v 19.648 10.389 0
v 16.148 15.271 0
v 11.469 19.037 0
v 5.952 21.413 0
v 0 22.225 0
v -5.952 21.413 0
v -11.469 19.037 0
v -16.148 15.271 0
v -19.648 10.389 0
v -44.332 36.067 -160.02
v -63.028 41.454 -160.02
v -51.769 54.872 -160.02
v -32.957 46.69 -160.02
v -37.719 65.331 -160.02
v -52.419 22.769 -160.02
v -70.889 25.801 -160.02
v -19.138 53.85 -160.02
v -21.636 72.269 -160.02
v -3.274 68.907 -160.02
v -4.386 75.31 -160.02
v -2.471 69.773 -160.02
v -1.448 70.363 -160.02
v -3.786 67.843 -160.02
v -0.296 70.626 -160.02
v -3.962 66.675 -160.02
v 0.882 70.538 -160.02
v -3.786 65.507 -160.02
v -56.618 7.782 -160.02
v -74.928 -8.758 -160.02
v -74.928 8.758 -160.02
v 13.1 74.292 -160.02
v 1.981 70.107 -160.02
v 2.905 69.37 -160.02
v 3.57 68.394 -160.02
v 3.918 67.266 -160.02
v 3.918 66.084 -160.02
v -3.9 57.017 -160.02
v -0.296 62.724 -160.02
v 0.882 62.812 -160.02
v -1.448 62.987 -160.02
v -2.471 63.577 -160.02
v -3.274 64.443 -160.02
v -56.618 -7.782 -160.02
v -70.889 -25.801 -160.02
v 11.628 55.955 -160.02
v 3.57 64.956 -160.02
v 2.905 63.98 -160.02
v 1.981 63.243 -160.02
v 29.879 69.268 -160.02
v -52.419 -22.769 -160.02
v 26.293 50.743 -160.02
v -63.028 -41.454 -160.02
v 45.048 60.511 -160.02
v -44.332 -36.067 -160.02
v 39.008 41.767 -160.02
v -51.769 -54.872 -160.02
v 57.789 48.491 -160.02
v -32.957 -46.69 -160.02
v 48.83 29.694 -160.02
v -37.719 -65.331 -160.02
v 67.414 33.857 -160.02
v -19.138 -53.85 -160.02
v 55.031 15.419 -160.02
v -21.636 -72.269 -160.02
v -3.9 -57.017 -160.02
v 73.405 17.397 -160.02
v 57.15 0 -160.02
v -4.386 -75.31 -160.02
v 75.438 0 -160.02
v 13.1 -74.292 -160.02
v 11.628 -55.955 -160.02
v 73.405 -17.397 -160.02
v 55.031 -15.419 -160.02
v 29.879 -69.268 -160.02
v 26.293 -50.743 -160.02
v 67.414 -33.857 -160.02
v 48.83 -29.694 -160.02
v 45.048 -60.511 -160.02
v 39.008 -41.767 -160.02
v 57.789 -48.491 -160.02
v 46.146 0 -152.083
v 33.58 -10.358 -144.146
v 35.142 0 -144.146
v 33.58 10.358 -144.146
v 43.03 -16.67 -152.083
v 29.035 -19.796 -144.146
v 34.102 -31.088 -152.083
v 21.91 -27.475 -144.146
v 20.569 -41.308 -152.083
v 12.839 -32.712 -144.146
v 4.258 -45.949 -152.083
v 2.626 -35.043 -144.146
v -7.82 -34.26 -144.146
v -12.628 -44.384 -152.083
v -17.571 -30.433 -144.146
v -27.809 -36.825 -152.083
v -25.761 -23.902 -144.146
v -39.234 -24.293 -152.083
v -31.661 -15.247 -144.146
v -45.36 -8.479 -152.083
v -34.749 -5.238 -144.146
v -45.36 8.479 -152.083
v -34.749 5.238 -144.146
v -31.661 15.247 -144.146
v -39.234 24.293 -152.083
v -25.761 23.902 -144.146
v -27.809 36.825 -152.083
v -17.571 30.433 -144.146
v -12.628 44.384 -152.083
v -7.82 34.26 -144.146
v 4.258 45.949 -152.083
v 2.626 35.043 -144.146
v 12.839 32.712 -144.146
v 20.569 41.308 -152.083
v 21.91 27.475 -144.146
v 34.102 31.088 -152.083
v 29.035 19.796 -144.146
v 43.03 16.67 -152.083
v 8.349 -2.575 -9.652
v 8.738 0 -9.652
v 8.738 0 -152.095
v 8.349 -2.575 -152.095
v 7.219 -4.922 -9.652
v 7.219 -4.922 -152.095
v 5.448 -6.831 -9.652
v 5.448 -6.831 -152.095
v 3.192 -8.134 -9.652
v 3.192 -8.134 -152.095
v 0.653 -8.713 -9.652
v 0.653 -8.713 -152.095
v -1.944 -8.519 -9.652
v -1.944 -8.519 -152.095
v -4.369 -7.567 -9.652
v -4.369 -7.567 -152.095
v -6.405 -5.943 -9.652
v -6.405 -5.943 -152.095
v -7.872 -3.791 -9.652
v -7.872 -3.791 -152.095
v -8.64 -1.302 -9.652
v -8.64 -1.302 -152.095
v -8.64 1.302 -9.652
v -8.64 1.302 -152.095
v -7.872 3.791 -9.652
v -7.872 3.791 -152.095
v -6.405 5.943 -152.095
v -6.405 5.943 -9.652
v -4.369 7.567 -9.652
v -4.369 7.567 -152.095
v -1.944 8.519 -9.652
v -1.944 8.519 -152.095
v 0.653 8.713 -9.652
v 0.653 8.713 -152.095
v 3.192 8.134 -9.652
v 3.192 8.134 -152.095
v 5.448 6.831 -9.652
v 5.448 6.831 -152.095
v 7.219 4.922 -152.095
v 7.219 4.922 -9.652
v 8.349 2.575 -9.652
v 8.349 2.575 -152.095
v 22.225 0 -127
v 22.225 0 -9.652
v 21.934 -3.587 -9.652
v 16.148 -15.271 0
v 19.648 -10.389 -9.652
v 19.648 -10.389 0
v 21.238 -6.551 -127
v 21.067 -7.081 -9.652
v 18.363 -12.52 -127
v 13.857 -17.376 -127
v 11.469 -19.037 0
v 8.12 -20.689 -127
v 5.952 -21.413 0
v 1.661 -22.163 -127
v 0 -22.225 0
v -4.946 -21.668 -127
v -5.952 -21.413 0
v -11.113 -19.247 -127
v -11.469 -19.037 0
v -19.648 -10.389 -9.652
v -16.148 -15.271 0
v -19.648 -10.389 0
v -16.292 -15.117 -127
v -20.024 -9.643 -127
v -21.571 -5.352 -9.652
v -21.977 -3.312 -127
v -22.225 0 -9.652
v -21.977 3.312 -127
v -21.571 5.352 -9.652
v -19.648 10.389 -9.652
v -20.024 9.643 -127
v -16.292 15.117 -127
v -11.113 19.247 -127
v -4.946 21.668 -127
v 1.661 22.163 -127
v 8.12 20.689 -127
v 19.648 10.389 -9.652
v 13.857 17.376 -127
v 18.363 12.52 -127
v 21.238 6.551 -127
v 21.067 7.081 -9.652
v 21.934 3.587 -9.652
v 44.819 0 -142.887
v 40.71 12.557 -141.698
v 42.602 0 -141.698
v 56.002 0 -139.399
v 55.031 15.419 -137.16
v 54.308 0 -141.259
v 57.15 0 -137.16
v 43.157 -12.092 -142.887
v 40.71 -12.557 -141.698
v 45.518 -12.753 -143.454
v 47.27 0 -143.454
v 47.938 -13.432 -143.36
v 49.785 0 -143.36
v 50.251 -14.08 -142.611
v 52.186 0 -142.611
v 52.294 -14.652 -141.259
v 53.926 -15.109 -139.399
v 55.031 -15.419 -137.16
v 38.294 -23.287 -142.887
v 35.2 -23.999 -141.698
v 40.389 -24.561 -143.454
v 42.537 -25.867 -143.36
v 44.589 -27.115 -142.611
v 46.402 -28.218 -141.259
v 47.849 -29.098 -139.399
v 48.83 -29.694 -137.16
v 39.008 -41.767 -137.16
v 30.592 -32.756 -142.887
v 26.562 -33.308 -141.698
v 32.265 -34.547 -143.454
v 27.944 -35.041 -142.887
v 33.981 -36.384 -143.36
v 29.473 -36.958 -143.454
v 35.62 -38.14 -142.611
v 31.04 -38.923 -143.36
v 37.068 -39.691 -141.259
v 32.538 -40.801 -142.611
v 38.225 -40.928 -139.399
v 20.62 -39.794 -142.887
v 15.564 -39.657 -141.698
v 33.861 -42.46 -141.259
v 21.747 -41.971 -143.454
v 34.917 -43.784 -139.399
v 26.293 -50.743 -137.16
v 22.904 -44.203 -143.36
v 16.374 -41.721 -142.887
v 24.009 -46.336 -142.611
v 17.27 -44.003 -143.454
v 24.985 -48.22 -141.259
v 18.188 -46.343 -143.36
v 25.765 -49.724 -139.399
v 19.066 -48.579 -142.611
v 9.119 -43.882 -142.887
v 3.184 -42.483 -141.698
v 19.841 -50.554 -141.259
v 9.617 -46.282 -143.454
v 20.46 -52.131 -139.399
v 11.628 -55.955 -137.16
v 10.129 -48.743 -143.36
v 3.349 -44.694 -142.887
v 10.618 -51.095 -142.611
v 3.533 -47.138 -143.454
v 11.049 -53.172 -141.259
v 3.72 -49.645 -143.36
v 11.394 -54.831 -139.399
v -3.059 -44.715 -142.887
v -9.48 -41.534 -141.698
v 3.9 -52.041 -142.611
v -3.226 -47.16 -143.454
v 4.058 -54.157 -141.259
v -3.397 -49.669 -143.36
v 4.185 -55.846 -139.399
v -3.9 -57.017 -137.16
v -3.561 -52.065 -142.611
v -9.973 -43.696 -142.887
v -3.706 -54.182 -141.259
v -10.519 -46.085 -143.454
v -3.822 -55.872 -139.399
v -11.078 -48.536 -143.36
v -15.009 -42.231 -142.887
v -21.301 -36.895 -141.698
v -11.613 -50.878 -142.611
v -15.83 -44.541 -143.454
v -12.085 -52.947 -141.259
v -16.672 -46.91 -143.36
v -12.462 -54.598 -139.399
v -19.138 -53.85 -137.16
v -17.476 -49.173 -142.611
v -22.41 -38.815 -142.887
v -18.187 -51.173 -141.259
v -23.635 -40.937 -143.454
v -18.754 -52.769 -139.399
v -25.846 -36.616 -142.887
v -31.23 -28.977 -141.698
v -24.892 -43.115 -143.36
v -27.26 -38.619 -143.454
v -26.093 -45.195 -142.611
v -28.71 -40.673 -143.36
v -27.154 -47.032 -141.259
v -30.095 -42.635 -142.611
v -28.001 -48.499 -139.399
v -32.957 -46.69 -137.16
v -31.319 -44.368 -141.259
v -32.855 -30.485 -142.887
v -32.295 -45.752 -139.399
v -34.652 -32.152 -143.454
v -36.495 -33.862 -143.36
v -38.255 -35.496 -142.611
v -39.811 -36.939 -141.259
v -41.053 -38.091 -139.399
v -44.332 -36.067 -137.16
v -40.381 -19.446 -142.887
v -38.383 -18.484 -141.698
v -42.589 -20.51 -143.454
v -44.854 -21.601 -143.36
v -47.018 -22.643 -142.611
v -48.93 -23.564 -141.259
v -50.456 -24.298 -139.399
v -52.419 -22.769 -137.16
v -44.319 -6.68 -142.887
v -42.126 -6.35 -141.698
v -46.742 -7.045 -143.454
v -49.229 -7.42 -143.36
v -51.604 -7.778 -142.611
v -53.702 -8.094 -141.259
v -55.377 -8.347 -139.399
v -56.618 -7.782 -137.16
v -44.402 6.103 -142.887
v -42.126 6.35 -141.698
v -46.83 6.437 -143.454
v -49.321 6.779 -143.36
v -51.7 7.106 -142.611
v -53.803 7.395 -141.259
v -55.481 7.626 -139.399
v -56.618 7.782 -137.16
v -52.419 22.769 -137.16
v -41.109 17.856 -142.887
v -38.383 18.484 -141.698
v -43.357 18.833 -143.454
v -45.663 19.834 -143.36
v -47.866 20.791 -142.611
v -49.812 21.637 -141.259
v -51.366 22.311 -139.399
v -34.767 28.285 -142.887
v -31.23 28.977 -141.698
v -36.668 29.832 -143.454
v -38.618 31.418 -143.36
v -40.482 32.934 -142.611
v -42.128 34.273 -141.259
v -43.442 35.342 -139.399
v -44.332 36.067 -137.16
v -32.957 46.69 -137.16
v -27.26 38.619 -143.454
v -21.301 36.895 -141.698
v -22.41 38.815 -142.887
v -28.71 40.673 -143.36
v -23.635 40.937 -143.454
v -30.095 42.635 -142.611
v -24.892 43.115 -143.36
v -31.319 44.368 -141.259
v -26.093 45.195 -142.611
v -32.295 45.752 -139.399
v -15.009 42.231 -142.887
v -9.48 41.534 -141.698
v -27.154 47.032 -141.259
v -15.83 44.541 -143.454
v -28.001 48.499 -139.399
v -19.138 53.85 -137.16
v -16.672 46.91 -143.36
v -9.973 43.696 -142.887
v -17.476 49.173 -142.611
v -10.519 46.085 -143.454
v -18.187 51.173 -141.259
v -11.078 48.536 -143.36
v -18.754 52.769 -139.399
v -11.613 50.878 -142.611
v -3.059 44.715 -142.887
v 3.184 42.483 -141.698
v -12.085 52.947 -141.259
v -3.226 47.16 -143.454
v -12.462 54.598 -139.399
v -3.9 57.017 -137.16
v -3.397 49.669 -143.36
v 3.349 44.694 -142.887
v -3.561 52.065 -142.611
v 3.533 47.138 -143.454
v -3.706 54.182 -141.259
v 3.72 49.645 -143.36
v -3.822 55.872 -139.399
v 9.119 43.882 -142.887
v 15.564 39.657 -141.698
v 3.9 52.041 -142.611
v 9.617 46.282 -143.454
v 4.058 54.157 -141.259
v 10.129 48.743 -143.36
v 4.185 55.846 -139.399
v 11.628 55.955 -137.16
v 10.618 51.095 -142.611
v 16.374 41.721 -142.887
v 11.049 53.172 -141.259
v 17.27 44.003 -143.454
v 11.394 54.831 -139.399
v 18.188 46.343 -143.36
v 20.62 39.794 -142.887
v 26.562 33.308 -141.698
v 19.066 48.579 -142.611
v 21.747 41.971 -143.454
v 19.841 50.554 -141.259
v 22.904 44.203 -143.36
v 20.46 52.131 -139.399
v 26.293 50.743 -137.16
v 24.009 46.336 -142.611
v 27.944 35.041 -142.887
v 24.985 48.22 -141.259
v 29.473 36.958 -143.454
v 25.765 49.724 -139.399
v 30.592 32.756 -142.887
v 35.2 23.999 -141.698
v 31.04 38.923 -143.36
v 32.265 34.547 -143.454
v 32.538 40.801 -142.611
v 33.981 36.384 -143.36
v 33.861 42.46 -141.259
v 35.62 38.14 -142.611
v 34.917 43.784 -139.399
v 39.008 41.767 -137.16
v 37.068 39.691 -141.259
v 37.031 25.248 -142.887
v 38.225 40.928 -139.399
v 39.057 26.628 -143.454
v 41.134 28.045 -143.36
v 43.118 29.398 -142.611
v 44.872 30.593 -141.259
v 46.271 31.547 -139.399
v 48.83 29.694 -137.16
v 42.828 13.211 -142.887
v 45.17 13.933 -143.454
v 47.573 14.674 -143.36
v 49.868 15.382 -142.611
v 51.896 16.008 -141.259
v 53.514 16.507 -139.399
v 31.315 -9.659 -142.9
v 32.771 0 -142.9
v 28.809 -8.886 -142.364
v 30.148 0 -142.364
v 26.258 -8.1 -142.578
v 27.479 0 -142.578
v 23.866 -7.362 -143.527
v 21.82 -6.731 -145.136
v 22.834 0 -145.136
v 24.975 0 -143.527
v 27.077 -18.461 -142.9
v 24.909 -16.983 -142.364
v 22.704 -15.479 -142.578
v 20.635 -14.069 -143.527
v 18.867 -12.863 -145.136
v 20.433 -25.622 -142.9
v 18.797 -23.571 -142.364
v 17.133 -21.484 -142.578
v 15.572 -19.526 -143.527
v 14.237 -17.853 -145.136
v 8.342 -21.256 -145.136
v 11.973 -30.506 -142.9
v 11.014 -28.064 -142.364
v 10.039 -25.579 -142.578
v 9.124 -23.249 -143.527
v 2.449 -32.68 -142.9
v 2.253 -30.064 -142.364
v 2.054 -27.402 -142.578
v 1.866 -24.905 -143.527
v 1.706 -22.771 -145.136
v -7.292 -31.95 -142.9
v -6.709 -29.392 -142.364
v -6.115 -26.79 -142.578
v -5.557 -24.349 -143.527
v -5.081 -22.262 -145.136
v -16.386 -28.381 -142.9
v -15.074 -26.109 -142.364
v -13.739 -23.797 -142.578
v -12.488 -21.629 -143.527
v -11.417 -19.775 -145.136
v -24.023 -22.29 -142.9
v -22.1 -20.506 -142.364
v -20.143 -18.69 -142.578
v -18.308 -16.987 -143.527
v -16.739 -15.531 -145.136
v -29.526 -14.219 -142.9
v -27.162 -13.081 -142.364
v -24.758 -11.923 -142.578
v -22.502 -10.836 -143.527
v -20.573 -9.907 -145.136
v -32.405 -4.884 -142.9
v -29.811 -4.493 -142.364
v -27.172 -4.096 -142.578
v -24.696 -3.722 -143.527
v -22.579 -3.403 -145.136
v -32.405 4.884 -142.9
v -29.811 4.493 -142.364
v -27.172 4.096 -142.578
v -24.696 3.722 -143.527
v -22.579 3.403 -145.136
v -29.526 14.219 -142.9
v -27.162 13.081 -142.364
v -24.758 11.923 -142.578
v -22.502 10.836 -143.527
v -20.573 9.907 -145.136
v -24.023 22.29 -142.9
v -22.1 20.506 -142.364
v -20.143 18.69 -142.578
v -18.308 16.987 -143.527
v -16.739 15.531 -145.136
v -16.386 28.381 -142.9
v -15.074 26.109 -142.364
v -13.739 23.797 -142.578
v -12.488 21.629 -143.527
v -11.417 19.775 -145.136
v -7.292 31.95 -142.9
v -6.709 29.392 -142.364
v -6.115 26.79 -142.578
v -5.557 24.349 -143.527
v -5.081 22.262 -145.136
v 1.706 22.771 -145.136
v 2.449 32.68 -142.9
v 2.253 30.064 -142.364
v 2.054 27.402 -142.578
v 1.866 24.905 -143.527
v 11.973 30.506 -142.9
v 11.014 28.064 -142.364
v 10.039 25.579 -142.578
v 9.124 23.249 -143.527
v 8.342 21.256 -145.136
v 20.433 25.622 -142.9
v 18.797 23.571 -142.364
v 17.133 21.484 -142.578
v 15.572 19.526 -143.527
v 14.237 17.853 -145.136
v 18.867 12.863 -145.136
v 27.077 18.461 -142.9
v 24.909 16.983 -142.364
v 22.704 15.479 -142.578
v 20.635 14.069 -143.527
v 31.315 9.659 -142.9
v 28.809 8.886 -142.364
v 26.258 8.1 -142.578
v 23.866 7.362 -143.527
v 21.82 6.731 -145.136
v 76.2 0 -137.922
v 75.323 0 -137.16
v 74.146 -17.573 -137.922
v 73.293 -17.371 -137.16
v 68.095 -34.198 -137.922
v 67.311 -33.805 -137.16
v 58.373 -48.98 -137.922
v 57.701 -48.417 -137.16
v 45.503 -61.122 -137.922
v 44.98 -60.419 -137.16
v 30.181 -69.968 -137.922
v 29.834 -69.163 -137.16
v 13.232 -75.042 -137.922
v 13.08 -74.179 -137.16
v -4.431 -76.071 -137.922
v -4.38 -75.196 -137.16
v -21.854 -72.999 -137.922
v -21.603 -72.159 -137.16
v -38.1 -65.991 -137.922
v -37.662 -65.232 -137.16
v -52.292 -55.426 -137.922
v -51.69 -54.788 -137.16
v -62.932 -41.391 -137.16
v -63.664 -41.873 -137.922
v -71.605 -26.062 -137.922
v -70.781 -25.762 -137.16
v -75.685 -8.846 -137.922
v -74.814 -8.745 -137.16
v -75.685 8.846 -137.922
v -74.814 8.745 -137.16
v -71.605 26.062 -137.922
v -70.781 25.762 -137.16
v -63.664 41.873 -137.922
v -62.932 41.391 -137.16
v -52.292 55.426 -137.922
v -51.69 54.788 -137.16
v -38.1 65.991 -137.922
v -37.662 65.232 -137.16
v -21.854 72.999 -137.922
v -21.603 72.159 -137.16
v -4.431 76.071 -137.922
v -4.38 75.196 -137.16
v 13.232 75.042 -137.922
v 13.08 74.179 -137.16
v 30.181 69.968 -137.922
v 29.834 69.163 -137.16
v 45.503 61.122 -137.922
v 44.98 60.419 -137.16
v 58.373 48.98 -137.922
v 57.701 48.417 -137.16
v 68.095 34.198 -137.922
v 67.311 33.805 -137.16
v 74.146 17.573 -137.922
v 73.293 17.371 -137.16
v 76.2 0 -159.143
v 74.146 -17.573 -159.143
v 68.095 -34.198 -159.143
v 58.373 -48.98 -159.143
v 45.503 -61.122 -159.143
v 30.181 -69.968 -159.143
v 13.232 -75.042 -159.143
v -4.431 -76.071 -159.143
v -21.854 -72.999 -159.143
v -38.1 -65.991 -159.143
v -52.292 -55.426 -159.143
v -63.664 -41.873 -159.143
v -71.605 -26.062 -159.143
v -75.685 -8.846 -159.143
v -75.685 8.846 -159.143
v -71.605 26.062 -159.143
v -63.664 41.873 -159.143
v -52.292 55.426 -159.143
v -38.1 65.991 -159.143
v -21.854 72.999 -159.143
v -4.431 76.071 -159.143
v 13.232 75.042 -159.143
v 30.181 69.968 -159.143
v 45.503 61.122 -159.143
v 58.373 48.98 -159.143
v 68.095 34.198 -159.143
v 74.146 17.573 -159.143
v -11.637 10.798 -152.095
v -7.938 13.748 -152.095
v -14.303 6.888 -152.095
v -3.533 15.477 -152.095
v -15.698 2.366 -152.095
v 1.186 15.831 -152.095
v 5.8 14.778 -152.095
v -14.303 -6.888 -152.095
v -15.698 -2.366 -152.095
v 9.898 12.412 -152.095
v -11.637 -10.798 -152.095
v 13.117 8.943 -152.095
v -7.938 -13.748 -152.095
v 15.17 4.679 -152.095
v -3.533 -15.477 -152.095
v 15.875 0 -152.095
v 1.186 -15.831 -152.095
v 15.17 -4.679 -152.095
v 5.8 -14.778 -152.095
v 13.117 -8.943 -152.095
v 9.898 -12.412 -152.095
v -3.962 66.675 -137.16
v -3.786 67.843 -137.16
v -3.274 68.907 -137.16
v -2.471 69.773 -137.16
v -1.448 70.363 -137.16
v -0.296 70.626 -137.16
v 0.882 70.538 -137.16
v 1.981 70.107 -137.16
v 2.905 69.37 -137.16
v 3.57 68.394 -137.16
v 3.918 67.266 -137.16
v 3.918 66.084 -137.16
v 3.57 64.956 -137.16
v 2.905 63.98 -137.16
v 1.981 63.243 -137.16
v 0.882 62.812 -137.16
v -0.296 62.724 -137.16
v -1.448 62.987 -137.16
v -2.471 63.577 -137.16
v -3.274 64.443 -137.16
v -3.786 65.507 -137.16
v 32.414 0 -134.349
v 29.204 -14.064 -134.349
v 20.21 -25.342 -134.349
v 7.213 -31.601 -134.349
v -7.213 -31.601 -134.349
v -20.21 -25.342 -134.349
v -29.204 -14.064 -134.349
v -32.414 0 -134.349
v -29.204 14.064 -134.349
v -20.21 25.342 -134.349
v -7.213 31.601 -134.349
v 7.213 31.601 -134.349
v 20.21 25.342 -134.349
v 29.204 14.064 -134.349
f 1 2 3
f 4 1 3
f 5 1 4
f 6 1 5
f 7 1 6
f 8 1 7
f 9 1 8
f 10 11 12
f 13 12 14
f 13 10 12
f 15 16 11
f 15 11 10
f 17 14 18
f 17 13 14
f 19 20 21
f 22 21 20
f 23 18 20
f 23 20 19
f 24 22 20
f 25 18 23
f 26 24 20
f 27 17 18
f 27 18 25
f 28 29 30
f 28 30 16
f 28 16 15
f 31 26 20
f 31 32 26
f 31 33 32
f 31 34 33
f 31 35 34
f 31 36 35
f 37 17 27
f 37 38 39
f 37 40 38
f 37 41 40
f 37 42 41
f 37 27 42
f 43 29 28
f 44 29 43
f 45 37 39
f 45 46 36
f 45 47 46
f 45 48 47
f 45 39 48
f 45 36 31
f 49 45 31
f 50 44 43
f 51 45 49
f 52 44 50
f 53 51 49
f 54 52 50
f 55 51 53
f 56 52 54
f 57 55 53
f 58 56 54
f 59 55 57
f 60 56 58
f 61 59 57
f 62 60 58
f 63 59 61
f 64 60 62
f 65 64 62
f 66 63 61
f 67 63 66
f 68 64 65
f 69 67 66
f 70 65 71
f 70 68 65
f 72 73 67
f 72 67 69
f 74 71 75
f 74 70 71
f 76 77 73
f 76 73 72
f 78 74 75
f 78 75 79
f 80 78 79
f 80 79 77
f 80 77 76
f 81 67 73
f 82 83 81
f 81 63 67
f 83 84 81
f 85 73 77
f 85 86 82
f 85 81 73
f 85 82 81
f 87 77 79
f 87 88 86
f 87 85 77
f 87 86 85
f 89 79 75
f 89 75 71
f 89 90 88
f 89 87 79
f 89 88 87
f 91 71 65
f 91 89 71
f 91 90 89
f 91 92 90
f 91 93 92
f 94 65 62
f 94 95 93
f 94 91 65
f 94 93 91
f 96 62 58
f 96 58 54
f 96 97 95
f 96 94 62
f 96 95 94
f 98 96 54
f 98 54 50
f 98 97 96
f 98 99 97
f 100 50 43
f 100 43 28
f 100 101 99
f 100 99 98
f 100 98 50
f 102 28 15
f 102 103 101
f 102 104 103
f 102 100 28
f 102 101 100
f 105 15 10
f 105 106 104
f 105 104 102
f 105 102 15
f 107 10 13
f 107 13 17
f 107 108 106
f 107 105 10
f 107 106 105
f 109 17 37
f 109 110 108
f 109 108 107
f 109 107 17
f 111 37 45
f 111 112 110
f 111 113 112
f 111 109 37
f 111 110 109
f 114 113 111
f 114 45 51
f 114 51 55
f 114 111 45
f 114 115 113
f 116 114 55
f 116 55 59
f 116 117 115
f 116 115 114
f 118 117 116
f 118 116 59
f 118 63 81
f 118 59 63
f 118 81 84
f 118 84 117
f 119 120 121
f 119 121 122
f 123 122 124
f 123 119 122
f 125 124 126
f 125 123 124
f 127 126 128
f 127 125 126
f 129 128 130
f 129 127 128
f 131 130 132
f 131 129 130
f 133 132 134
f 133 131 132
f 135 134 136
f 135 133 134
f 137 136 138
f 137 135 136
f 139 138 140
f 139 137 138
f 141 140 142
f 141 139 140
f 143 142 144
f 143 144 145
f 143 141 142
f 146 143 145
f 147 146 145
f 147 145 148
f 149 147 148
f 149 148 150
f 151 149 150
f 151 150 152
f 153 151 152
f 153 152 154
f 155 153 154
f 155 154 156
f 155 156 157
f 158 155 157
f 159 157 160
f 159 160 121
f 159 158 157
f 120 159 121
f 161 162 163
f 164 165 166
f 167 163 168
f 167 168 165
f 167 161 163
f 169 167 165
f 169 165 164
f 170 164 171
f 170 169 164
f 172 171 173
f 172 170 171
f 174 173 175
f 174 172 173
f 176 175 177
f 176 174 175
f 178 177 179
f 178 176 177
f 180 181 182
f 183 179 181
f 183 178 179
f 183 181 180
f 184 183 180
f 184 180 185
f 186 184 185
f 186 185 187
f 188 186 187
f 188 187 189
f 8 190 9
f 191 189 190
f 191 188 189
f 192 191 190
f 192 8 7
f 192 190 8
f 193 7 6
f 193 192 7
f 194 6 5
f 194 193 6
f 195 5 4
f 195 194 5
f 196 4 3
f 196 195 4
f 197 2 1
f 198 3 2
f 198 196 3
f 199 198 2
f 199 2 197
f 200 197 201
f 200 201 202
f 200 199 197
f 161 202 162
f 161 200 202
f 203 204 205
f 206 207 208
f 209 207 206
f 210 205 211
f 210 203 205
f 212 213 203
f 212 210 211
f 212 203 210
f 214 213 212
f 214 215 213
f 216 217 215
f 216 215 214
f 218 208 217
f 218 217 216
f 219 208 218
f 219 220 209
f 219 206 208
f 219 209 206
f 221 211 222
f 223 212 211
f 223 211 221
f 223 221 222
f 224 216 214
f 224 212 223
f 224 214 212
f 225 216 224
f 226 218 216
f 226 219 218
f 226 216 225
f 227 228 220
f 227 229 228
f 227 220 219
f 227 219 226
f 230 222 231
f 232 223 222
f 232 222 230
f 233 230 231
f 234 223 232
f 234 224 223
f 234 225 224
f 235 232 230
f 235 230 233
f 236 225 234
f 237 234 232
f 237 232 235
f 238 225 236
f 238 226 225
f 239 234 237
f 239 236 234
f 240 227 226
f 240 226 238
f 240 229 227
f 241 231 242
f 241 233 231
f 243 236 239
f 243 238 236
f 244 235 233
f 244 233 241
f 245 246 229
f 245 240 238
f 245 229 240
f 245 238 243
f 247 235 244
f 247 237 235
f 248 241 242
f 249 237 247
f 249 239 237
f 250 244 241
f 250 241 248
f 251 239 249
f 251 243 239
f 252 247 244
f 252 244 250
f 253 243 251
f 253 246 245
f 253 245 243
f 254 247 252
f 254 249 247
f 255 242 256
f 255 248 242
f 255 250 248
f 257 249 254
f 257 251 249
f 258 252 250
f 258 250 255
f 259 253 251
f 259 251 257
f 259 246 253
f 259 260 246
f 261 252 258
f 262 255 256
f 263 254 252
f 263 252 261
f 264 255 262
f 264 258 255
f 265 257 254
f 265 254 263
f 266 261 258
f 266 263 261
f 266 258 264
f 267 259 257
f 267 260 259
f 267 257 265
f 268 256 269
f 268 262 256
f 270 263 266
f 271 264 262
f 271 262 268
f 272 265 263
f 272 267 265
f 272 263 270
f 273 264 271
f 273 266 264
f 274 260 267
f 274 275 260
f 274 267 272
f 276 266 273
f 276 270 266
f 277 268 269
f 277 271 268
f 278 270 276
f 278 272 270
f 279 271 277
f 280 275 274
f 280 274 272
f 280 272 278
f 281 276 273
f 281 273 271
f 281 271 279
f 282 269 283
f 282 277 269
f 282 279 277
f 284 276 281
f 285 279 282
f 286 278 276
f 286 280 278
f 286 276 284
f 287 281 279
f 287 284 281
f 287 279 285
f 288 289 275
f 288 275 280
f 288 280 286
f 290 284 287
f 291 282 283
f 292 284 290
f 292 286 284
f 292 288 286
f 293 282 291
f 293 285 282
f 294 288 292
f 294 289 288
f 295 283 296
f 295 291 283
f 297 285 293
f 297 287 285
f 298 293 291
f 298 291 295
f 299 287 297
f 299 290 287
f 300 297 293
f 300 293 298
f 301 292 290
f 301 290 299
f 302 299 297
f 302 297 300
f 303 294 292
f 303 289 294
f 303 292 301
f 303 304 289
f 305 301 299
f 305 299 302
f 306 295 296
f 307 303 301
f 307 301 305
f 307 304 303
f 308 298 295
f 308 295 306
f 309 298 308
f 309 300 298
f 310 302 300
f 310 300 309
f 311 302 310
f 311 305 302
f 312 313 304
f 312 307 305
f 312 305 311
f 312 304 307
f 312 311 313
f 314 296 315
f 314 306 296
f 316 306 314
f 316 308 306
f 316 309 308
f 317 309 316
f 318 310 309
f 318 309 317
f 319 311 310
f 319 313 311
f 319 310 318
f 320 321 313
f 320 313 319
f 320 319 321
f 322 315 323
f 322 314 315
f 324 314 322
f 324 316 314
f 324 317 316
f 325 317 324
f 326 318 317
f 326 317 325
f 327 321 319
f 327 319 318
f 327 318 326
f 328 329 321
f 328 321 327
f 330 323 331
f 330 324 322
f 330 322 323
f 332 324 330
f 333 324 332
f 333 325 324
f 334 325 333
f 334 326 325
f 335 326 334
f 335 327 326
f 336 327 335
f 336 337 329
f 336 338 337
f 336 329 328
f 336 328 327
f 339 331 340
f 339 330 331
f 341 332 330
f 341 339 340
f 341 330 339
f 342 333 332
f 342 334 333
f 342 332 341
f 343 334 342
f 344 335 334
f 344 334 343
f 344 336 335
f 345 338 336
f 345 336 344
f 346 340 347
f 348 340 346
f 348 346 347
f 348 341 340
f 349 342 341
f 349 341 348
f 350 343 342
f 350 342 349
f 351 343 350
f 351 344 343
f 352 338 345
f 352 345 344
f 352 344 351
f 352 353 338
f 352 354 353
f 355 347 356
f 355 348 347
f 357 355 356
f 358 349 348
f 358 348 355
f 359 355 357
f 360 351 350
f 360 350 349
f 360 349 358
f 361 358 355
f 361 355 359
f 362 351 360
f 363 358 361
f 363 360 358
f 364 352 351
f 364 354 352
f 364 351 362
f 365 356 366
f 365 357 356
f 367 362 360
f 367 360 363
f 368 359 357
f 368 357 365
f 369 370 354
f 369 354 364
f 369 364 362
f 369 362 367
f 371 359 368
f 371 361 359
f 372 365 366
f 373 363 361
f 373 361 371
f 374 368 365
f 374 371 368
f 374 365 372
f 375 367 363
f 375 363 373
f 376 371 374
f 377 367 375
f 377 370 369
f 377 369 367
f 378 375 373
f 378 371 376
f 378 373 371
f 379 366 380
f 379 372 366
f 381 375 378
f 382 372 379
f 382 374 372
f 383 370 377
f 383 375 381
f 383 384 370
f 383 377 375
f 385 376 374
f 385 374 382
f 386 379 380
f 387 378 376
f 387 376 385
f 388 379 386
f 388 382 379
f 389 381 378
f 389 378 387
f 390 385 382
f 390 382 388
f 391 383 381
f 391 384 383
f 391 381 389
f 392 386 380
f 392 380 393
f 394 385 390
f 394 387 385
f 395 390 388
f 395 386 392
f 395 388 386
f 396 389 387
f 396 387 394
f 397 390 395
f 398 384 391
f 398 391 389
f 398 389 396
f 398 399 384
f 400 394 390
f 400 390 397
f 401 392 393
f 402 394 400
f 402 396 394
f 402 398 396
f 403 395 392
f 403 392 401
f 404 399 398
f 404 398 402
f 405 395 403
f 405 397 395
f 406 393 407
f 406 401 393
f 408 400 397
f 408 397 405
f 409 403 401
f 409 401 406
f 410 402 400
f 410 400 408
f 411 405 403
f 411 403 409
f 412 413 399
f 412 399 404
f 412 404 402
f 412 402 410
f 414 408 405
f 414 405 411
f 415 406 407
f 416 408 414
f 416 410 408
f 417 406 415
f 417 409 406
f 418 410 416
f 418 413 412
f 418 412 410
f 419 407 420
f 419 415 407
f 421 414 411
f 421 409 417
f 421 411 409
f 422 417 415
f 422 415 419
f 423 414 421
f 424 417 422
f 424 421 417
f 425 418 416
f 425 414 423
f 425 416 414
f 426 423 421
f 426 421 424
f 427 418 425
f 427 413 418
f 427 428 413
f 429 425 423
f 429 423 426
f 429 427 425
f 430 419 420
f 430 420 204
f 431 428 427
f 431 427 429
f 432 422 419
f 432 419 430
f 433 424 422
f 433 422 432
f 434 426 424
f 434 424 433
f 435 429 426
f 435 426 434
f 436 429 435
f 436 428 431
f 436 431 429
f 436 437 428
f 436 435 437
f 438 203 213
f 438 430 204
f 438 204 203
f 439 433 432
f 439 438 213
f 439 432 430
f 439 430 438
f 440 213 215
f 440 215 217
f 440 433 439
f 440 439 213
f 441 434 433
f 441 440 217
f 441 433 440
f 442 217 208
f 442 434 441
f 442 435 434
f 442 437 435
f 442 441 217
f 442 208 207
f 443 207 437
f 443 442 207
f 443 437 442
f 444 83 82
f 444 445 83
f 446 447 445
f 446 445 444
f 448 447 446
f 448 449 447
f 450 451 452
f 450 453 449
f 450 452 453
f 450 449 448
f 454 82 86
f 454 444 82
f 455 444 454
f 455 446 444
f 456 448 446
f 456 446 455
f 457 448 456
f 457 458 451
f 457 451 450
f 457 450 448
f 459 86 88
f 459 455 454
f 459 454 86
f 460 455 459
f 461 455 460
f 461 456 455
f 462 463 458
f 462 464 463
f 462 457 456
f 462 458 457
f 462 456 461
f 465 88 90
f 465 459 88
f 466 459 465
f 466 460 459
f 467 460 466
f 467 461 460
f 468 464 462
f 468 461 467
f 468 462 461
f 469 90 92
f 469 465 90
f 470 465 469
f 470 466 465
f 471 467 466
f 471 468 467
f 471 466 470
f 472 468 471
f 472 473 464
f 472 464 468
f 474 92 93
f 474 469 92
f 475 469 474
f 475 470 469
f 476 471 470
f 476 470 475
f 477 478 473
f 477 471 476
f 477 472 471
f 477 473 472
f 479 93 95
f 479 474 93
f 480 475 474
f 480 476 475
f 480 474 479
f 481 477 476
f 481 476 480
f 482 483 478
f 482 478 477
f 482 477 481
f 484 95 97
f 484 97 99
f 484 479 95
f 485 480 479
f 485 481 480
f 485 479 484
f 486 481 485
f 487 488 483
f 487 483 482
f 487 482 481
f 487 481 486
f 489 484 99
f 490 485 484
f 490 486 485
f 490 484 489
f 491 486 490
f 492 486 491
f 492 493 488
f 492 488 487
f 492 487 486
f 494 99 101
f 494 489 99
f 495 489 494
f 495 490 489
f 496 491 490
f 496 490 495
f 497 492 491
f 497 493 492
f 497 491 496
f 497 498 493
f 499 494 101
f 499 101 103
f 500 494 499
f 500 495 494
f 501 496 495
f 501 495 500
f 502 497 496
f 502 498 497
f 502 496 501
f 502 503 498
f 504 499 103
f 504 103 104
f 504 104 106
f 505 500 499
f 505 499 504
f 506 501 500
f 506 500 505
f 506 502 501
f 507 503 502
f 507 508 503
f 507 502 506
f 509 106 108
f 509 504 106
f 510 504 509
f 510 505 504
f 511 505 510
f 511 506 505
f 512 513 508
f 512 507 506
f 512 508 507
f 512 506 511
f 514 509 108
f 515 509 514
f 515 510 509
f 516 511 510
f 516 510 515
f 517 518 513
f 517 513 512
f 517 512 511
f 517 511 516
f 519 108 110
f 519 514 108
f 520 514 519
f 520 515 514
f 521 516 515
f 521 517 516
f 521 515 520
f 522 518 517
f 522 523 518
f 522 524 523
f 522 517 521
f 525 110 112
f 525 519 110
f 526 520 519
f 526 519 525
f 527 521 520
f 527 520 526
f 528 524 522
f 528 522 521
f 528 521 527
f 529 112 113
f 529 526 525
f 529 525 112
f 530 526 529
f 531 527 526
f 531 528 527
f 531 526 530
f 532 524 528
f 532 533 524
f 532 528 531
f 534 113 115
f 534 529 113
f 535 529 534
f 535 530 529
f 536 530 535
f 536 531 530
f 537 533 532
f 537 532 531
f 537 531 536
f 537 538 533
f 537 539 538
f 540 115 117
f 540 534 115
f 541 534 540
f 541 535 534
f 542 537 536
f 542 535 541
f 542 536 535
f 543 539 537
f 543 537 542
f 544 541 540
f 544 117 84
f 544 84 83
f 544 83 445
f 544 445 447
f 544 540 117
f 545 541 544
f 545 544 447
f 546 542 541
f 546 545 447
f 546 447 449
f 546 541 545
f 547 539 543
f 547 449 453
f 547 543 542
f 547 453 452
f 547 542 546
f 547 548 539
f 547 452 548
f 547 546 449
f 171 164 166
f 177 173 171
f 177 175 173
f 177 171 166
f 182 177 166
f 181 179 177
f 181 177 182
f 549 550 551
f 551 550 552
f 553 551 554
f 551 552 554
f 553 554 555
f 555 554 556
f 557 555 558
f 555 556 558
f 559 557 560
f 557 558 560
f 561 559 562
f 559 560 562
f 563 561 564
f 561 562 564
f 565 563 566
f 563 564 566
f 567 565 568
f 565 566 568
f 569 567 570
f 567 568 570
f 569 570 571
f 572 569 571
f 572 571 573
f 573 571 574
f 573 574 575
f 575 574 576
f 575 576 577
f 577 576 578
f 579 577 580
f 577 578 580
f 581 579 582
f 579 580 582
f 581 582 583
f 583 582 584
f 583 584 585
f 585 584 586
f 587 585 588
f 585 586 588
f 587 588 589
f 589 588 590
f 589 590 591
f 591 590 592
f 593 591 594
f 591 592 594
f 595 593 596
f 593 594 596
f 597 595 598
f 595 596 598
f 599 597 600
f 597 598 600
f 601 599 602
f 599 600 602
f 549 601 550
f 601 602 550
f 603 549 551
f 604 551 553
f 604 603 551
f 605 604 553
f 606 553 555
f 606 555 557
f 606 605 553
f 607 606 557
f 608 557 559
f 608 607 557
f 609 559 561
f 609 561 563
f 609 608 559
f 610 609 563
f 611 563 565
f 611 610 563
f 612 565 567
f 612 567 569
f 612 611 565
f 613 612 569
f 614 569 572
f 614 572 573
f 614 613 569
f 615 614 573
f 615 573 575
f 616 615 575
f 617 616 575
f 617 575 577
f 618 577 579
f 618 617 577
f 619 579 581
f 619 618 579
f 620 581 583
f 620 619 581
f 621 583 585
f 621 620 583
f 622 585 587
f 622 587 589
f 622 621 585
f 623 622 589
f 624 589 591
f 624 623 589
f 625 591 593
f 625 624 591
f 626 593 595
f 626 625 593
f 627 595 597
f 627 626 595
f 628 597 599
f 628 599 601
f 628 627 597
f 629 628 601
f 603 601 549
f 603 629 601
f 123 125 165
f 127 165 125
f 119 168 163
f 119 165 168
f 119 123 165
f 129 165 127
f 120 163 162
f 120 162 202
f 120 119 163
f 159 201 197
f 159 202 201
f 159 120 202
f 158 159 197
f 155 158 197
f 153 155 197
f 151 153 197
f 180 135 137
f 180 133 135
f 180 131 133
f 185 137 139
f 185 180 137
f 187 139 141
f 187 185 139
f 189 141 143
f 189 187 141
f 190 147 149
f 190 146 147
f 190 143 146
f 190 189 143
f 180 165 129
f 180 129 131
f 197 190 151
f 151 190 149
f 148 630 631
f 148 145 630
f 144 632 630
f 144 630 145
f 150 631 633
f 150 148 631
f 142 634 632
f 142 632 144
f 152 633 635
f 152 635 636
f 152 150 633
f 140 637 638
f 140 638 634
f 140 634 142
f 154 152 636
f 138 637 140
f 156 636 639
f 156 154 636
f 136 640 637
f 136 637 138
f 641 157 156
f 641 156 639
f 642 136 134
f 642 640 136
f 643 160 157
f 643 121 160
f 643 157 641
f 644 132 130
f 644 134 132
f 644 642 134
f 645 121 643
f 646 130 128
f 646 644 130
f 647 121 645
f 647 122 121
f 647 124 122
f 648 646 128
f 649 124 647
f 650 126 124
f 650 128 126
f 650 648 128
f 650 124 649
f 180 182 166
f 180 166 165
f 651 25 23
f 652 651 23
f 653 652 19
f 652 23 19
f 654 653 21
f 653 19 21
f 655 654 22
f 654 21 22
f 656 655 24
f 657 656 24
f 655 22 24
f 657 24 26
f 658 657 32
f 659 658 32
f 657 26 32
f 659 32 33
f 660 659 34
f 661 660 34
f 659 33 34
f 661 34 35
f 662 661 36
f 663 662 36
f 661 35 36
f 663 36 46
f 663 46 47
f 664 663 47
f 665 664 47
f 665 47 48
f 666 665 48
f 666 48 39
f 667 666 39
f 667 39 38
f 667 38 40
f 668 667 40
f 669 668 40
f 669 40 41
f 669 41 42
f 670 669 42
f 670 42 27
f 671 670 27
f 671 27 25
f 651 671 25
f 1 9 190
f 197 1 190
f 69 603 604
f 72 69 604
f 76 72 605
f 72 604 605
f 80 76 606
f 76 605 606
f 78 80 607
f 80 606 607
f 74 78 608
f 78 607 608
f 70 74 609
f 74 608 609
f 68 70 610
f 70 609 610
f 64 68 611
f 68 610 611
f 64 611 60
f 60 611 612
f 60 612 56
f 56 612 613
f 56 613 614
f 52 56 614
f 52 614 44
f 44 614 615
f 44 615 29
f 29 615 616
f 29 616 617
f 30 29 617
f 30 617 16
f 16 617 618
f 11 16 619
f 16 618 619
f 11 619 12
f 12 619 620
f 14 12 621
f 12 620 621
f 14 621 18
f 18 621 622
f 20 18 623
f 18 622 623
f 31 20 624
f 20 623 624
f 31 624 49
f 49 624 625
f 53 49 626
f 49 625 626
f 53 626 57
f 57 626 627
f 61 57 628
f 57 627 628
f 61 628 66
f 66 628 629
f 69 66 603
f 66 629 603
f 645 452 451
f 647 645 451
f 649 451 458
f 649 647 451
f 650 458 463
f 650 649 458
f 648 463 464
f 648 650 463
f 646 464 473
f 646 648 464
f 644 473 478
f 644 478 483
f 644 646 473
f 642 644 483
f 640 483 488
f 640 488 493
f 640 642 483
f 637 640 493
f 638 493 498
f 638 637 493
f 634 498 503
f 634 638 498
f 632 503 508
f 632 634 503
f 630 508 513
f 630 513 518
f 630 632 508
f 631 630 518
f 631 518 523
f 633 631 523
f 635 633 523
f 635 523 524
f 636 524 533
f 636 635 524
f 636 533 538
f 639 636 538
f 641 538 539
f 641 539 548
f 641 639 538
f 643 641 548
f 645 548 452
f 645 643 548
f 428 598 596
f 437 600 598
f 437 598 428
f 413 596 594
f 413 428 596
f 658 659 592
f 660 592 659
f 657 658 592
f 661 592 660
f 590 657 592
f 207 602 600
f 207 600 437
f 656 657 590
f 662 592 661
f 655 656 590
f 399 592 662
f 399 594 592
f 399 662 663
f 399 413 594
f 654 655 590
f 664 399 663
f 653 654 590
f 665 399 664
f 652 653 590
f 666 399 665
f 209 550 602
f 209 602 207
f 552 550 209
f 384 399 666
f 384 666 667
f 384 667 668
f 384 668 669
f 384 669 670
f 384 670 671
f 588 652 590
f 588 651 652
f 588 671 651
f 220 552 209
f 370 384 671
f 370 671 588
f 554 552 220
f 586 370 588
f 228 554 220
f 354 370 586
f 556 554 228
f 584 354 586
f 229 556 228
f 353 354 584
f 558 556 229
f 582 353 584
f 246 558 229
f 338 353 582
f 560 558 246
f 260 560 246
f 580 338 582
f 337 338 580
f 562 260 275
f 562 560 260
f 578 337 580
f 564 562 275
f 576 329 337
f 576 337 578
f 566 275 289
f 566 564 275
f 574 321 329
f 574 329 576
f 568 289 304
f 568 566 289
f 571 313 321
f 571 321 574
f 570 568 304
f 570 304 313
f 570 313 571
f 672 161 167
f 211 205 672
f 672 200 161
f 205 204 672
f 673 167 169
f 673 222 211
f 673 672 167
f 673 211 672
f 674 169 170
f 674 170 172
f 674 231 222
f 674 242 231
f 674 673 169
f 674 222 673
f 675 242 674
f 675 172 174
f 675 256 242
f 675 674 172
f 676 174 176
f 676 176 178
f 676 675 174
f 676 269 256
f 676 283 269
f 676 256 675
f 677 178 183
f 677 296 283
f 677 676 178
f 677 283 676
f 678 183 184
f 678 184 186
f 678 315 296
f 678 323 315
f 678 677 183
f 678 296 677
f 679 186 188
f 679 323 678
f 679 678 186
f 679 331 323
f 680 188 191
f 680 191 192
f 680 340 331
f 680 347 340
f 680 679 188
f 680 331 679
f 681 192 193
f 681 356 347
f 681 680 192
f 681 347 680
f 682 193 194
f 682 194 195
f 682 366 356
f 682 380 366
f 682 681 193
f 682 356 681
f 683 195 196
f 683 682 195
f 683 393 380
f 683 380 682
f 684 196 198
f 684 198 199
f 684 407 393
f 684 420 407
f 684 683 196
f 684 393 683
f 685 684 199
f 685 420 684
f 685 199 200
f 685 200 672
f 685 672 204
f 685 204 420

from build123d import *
from OCP.BRepFilletAPI import BRepFilletAPI_MakeChamfer

# Parameters (mm, degrees)
CHAMFER1_SIZE           = 0.762
CHAMFER1_SIZE2          = 0.876580726
CUT_EXTRUDE1_DEPTH      = 193.922990854
CUT_EXTRUDE1_DEPTH_BACK = 193.922990854
SKETCH2_W               = 9.652
SKETCH2_H               = 20.7772
SKETCH3_R               = 3.9624
CUT_EXTRUDE2_DEPTH      = 193.922990854


with BuildPart() as part:
    # Sketch1 → Revolve1 (revolve)
    with BuildSketch(Plane(origin=(0, 0, 0), x_dir=(0, 0, -1), z_dir=(1, 0, 0)), mode=Mode.PRIVATE) as revolve1_sk:
        with BuildLine():
            Line((0, 8.7376), (0, 22.225))
            Line((0, 22.225), (127, 22.225))
            Line((127, 22.225), (141.697599691, 42.602209504))
            ThreePointArc((141.697599691, 42.602209504), (143.065361481, 51.010384281), (137.16, 57.15))
            Line((137.16, 57.15), (137.16, 76.2))
            Line((137.16, 76.2), (160.02, 76.2))
            Line((160.02, 76.2), (160.02, 57.15))
            Line((160.02, 57.15), (144.145832257, 35.141559942))
            ThreePointArc((144.145832257, 35.141559942), (142.376686305, 28.805838284), (145.135826502, 22.834373498))
            Line((145.135826502, 22.834373498), (152.0952, 15.875))
            Line((152.0952, 15.875), (152.0952, 8.7376))
            Line((152.0952, 8.7376), (0, 8.7376))
        make_face()
    revolve(revolve1_sk.sketch.rotate(Axis((0, 0, 0), (0, 0, -1)), 90), axis=Axis((0, 0, 0), (0, 0, -1)))

    # Chamfer1: one chamfer whose edges measure the first distance from different faces: ONE call of the kernel's chamfer builder (chamfer() names one face for all edges)
    chamfer1_edges_1 = [part.edges().sort_by_distance(p)[0] for p in [
        (-76.2, 0, -160.02),
    ]]
    chamfer1_side_1 = [part.faces().sort_by_distance(p)[0] for p in [
        (-74.044738531, 0, -160.02),
    ]]
    chamfer1_edges_2 = [part.edges().sort_by_distance(p)[0] for p in [
        (-76.2, 0, -137.16),
    ]]
    chamfer1_side_2 = [part.faces().sort_by_distance(p)[0] for p in [
        (-76.2, 0, -148.59),
    ]]
    chamfer1 = BRepFilletAPI_MakeChamfer(part.part.solid().wrapped)
    for e in chamfer1_edges_1:
        chamfer1.Add(CHAMFER1_SIZE, CHAMFER1_SIZE2, e.wrapped, chamfer1_side_1[0].wrapped)  # the first distance lies on this face
    for e in chamfer1_edges_2:
        chamfer1.Add(CHAMFER1_SIZE, CHAMFER1_SIZE2, e.wrapped, chamfer1_side_2[0].wrapped)  # the first distance lies on this face
    add(Compound.cast(chamfer1.Shape()), mode=Mode.REPLACE)

    # Sketch2 → Cut-Extrude1 (cut, two sides: drawn at the far end of the back side and taken through both)
    with BuildSketch(Plane(origin=(0, 0, 0), x_dir=(0, 0, -1), z_dir=(1, 0, 0)).offset(-CUT_EXTRUDE1_DEPTH_BACK)):
        with Locations((4.826, 0)):
            Rectangle(SKETCH2_W, SKETCH2_H)
    extrude(amount=CUT_EXTRUDE1_DEPTH + CUT_EXTRUDE1_DEPTH_BACK, mode=Mode.SUBTRACT)

    # Sketch3 → Cut-Extrude2 (cut, through all)
    with BuildSketch(Plane(origin=(0, 0, -160.02), x_dir=(-1, 0, 0), z_dir=(0, 0, -1))):
        with Locations((0, 66.675)):
            Circle(SKETCH3_R)
    extrude(amount=-CUT_EXTRUDE2_DEPTH, mode=Mode.SUBTRACT)


solid = part.part
